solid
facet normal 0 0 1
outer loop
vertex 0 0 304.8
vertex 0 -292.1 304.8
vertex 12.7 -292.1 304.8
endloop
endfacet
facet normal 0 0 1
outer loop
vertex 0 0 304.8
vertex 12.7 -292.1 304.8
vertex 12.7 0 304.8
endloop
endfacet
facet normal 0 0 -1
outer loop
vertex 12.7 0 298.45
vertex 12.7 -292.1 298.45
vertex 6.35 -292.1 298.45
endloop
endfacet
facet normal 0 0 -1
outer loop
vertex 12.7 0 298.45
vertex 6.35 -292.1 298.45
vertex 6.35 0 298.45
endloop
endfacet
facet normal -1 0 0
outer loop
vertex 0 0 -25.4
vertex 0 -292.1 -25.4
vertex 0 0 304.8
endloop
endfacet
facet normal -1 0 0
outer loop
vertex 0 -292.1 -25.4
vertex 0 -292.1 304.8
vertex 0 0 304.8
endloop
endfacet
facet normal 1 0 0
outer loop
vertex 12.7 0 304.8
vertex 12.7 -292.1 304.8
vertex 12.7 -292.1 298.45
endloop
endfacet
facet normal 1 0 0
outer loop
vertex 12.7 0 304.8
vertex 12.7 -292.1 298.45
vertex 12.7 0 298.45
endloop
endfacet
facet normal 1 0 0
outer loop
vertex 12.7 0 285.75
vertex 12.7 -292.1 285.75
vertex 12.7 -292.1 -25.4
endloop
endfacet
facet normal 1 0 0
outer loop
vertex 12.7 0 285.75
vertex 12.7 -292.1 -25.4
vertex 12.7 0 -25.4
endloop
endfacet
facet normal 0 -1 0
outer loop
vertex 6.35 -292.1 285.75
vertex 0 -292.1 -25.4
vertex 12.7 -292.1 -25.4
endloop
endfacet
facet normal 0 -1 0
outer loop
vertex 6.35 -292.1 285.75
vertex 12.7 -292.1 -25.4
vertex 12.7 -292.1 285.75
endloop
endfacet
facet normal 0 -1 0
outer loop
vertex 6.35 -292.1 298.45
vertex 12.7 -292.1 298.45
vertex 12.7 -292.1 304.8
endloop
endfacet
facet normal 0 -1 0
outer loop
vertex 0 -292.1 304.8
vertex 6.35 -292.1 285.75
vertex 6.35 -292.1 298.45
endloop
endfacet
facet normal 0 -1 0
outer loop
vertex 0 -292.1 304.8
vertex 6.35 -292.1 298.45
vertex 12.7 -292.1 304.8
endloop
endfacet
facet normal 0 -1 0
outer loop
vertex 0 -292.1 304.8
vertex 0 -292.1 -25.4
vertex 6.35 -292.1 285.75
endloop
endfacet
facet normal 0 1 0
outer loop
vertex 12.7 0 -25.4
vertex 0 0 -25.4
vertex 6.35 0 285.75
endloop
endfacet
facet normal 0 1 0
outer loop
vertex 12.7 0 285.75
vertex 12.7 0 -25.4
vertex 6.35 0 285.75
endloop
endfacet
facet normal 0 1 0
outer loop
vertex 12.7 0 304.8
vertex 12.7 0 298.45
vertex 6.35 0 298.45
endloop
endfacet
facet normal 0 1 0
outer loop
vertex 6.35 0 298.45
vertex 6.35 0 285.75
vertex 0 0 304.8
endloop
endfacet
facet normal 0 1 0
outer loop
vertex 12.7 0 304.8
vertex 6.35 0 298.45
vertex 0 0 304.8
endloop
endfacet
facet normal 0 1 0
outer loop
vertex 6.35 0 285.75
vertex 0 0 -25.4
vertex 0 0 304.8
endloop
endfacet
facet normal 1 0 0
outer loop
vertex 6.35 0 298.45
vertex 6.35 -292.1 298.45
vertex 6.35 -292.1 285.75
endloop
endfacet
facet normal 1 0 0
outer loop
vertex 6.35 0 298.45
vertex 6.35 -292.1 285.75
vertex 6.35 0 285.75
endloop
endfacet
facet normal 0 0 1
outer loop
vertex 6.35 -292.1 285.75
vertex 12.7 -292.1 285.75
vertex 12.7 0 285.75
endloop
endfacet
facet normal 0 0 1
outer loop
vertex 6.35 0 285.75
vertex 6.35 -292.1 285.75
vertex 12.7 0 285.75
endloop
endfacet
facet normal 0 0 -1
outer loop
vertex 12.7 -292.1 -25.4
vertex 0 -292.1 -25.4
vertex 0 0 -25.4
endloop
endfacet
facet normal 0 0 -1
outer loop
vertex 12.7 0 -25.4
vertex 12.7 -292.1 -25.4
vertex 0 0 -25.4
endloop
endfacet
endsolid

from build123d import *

# Parameters (mm, degrees)
F0_W     = 292.1
F0_H     = 304.8
F1_DEPTH = 12.7
F2_W     = 292.1
F2_H     = 25.4
F3_DEPTH = 12.7
F4_W     = 292.1
F4_H     = 12.7
F5_DEPTH = 6.35


with BuildPart() as f1:
    # F0 (on Right) → F1 (new body)
    with BuildSketch(Plane.YZ):
        with Locations((-146.05, 152.4)):
            Rectangle(F0_W, F0_H)
    extrude(amount=F1_DEPTH)

    # F2 (on Right) → F3 (join)
    with BuildSketch(Plane.YZ):
        with Locations((-146.05, -12.7)):
            Rectangle(F2_W, F2_H)
    extrude(amount=F3_DEPTH)

    # F4 (on face) → F5 (cut)
    with BuildSketch(Plane.YZ.offset(12.7)):
        with Locations((-146.05, 292.1)):
            Rectangle(F4_W, F4_H)
    extrude(amount=-F5_DEPTH, mode=Mode.SUBTRACT)


solid = f1.part
